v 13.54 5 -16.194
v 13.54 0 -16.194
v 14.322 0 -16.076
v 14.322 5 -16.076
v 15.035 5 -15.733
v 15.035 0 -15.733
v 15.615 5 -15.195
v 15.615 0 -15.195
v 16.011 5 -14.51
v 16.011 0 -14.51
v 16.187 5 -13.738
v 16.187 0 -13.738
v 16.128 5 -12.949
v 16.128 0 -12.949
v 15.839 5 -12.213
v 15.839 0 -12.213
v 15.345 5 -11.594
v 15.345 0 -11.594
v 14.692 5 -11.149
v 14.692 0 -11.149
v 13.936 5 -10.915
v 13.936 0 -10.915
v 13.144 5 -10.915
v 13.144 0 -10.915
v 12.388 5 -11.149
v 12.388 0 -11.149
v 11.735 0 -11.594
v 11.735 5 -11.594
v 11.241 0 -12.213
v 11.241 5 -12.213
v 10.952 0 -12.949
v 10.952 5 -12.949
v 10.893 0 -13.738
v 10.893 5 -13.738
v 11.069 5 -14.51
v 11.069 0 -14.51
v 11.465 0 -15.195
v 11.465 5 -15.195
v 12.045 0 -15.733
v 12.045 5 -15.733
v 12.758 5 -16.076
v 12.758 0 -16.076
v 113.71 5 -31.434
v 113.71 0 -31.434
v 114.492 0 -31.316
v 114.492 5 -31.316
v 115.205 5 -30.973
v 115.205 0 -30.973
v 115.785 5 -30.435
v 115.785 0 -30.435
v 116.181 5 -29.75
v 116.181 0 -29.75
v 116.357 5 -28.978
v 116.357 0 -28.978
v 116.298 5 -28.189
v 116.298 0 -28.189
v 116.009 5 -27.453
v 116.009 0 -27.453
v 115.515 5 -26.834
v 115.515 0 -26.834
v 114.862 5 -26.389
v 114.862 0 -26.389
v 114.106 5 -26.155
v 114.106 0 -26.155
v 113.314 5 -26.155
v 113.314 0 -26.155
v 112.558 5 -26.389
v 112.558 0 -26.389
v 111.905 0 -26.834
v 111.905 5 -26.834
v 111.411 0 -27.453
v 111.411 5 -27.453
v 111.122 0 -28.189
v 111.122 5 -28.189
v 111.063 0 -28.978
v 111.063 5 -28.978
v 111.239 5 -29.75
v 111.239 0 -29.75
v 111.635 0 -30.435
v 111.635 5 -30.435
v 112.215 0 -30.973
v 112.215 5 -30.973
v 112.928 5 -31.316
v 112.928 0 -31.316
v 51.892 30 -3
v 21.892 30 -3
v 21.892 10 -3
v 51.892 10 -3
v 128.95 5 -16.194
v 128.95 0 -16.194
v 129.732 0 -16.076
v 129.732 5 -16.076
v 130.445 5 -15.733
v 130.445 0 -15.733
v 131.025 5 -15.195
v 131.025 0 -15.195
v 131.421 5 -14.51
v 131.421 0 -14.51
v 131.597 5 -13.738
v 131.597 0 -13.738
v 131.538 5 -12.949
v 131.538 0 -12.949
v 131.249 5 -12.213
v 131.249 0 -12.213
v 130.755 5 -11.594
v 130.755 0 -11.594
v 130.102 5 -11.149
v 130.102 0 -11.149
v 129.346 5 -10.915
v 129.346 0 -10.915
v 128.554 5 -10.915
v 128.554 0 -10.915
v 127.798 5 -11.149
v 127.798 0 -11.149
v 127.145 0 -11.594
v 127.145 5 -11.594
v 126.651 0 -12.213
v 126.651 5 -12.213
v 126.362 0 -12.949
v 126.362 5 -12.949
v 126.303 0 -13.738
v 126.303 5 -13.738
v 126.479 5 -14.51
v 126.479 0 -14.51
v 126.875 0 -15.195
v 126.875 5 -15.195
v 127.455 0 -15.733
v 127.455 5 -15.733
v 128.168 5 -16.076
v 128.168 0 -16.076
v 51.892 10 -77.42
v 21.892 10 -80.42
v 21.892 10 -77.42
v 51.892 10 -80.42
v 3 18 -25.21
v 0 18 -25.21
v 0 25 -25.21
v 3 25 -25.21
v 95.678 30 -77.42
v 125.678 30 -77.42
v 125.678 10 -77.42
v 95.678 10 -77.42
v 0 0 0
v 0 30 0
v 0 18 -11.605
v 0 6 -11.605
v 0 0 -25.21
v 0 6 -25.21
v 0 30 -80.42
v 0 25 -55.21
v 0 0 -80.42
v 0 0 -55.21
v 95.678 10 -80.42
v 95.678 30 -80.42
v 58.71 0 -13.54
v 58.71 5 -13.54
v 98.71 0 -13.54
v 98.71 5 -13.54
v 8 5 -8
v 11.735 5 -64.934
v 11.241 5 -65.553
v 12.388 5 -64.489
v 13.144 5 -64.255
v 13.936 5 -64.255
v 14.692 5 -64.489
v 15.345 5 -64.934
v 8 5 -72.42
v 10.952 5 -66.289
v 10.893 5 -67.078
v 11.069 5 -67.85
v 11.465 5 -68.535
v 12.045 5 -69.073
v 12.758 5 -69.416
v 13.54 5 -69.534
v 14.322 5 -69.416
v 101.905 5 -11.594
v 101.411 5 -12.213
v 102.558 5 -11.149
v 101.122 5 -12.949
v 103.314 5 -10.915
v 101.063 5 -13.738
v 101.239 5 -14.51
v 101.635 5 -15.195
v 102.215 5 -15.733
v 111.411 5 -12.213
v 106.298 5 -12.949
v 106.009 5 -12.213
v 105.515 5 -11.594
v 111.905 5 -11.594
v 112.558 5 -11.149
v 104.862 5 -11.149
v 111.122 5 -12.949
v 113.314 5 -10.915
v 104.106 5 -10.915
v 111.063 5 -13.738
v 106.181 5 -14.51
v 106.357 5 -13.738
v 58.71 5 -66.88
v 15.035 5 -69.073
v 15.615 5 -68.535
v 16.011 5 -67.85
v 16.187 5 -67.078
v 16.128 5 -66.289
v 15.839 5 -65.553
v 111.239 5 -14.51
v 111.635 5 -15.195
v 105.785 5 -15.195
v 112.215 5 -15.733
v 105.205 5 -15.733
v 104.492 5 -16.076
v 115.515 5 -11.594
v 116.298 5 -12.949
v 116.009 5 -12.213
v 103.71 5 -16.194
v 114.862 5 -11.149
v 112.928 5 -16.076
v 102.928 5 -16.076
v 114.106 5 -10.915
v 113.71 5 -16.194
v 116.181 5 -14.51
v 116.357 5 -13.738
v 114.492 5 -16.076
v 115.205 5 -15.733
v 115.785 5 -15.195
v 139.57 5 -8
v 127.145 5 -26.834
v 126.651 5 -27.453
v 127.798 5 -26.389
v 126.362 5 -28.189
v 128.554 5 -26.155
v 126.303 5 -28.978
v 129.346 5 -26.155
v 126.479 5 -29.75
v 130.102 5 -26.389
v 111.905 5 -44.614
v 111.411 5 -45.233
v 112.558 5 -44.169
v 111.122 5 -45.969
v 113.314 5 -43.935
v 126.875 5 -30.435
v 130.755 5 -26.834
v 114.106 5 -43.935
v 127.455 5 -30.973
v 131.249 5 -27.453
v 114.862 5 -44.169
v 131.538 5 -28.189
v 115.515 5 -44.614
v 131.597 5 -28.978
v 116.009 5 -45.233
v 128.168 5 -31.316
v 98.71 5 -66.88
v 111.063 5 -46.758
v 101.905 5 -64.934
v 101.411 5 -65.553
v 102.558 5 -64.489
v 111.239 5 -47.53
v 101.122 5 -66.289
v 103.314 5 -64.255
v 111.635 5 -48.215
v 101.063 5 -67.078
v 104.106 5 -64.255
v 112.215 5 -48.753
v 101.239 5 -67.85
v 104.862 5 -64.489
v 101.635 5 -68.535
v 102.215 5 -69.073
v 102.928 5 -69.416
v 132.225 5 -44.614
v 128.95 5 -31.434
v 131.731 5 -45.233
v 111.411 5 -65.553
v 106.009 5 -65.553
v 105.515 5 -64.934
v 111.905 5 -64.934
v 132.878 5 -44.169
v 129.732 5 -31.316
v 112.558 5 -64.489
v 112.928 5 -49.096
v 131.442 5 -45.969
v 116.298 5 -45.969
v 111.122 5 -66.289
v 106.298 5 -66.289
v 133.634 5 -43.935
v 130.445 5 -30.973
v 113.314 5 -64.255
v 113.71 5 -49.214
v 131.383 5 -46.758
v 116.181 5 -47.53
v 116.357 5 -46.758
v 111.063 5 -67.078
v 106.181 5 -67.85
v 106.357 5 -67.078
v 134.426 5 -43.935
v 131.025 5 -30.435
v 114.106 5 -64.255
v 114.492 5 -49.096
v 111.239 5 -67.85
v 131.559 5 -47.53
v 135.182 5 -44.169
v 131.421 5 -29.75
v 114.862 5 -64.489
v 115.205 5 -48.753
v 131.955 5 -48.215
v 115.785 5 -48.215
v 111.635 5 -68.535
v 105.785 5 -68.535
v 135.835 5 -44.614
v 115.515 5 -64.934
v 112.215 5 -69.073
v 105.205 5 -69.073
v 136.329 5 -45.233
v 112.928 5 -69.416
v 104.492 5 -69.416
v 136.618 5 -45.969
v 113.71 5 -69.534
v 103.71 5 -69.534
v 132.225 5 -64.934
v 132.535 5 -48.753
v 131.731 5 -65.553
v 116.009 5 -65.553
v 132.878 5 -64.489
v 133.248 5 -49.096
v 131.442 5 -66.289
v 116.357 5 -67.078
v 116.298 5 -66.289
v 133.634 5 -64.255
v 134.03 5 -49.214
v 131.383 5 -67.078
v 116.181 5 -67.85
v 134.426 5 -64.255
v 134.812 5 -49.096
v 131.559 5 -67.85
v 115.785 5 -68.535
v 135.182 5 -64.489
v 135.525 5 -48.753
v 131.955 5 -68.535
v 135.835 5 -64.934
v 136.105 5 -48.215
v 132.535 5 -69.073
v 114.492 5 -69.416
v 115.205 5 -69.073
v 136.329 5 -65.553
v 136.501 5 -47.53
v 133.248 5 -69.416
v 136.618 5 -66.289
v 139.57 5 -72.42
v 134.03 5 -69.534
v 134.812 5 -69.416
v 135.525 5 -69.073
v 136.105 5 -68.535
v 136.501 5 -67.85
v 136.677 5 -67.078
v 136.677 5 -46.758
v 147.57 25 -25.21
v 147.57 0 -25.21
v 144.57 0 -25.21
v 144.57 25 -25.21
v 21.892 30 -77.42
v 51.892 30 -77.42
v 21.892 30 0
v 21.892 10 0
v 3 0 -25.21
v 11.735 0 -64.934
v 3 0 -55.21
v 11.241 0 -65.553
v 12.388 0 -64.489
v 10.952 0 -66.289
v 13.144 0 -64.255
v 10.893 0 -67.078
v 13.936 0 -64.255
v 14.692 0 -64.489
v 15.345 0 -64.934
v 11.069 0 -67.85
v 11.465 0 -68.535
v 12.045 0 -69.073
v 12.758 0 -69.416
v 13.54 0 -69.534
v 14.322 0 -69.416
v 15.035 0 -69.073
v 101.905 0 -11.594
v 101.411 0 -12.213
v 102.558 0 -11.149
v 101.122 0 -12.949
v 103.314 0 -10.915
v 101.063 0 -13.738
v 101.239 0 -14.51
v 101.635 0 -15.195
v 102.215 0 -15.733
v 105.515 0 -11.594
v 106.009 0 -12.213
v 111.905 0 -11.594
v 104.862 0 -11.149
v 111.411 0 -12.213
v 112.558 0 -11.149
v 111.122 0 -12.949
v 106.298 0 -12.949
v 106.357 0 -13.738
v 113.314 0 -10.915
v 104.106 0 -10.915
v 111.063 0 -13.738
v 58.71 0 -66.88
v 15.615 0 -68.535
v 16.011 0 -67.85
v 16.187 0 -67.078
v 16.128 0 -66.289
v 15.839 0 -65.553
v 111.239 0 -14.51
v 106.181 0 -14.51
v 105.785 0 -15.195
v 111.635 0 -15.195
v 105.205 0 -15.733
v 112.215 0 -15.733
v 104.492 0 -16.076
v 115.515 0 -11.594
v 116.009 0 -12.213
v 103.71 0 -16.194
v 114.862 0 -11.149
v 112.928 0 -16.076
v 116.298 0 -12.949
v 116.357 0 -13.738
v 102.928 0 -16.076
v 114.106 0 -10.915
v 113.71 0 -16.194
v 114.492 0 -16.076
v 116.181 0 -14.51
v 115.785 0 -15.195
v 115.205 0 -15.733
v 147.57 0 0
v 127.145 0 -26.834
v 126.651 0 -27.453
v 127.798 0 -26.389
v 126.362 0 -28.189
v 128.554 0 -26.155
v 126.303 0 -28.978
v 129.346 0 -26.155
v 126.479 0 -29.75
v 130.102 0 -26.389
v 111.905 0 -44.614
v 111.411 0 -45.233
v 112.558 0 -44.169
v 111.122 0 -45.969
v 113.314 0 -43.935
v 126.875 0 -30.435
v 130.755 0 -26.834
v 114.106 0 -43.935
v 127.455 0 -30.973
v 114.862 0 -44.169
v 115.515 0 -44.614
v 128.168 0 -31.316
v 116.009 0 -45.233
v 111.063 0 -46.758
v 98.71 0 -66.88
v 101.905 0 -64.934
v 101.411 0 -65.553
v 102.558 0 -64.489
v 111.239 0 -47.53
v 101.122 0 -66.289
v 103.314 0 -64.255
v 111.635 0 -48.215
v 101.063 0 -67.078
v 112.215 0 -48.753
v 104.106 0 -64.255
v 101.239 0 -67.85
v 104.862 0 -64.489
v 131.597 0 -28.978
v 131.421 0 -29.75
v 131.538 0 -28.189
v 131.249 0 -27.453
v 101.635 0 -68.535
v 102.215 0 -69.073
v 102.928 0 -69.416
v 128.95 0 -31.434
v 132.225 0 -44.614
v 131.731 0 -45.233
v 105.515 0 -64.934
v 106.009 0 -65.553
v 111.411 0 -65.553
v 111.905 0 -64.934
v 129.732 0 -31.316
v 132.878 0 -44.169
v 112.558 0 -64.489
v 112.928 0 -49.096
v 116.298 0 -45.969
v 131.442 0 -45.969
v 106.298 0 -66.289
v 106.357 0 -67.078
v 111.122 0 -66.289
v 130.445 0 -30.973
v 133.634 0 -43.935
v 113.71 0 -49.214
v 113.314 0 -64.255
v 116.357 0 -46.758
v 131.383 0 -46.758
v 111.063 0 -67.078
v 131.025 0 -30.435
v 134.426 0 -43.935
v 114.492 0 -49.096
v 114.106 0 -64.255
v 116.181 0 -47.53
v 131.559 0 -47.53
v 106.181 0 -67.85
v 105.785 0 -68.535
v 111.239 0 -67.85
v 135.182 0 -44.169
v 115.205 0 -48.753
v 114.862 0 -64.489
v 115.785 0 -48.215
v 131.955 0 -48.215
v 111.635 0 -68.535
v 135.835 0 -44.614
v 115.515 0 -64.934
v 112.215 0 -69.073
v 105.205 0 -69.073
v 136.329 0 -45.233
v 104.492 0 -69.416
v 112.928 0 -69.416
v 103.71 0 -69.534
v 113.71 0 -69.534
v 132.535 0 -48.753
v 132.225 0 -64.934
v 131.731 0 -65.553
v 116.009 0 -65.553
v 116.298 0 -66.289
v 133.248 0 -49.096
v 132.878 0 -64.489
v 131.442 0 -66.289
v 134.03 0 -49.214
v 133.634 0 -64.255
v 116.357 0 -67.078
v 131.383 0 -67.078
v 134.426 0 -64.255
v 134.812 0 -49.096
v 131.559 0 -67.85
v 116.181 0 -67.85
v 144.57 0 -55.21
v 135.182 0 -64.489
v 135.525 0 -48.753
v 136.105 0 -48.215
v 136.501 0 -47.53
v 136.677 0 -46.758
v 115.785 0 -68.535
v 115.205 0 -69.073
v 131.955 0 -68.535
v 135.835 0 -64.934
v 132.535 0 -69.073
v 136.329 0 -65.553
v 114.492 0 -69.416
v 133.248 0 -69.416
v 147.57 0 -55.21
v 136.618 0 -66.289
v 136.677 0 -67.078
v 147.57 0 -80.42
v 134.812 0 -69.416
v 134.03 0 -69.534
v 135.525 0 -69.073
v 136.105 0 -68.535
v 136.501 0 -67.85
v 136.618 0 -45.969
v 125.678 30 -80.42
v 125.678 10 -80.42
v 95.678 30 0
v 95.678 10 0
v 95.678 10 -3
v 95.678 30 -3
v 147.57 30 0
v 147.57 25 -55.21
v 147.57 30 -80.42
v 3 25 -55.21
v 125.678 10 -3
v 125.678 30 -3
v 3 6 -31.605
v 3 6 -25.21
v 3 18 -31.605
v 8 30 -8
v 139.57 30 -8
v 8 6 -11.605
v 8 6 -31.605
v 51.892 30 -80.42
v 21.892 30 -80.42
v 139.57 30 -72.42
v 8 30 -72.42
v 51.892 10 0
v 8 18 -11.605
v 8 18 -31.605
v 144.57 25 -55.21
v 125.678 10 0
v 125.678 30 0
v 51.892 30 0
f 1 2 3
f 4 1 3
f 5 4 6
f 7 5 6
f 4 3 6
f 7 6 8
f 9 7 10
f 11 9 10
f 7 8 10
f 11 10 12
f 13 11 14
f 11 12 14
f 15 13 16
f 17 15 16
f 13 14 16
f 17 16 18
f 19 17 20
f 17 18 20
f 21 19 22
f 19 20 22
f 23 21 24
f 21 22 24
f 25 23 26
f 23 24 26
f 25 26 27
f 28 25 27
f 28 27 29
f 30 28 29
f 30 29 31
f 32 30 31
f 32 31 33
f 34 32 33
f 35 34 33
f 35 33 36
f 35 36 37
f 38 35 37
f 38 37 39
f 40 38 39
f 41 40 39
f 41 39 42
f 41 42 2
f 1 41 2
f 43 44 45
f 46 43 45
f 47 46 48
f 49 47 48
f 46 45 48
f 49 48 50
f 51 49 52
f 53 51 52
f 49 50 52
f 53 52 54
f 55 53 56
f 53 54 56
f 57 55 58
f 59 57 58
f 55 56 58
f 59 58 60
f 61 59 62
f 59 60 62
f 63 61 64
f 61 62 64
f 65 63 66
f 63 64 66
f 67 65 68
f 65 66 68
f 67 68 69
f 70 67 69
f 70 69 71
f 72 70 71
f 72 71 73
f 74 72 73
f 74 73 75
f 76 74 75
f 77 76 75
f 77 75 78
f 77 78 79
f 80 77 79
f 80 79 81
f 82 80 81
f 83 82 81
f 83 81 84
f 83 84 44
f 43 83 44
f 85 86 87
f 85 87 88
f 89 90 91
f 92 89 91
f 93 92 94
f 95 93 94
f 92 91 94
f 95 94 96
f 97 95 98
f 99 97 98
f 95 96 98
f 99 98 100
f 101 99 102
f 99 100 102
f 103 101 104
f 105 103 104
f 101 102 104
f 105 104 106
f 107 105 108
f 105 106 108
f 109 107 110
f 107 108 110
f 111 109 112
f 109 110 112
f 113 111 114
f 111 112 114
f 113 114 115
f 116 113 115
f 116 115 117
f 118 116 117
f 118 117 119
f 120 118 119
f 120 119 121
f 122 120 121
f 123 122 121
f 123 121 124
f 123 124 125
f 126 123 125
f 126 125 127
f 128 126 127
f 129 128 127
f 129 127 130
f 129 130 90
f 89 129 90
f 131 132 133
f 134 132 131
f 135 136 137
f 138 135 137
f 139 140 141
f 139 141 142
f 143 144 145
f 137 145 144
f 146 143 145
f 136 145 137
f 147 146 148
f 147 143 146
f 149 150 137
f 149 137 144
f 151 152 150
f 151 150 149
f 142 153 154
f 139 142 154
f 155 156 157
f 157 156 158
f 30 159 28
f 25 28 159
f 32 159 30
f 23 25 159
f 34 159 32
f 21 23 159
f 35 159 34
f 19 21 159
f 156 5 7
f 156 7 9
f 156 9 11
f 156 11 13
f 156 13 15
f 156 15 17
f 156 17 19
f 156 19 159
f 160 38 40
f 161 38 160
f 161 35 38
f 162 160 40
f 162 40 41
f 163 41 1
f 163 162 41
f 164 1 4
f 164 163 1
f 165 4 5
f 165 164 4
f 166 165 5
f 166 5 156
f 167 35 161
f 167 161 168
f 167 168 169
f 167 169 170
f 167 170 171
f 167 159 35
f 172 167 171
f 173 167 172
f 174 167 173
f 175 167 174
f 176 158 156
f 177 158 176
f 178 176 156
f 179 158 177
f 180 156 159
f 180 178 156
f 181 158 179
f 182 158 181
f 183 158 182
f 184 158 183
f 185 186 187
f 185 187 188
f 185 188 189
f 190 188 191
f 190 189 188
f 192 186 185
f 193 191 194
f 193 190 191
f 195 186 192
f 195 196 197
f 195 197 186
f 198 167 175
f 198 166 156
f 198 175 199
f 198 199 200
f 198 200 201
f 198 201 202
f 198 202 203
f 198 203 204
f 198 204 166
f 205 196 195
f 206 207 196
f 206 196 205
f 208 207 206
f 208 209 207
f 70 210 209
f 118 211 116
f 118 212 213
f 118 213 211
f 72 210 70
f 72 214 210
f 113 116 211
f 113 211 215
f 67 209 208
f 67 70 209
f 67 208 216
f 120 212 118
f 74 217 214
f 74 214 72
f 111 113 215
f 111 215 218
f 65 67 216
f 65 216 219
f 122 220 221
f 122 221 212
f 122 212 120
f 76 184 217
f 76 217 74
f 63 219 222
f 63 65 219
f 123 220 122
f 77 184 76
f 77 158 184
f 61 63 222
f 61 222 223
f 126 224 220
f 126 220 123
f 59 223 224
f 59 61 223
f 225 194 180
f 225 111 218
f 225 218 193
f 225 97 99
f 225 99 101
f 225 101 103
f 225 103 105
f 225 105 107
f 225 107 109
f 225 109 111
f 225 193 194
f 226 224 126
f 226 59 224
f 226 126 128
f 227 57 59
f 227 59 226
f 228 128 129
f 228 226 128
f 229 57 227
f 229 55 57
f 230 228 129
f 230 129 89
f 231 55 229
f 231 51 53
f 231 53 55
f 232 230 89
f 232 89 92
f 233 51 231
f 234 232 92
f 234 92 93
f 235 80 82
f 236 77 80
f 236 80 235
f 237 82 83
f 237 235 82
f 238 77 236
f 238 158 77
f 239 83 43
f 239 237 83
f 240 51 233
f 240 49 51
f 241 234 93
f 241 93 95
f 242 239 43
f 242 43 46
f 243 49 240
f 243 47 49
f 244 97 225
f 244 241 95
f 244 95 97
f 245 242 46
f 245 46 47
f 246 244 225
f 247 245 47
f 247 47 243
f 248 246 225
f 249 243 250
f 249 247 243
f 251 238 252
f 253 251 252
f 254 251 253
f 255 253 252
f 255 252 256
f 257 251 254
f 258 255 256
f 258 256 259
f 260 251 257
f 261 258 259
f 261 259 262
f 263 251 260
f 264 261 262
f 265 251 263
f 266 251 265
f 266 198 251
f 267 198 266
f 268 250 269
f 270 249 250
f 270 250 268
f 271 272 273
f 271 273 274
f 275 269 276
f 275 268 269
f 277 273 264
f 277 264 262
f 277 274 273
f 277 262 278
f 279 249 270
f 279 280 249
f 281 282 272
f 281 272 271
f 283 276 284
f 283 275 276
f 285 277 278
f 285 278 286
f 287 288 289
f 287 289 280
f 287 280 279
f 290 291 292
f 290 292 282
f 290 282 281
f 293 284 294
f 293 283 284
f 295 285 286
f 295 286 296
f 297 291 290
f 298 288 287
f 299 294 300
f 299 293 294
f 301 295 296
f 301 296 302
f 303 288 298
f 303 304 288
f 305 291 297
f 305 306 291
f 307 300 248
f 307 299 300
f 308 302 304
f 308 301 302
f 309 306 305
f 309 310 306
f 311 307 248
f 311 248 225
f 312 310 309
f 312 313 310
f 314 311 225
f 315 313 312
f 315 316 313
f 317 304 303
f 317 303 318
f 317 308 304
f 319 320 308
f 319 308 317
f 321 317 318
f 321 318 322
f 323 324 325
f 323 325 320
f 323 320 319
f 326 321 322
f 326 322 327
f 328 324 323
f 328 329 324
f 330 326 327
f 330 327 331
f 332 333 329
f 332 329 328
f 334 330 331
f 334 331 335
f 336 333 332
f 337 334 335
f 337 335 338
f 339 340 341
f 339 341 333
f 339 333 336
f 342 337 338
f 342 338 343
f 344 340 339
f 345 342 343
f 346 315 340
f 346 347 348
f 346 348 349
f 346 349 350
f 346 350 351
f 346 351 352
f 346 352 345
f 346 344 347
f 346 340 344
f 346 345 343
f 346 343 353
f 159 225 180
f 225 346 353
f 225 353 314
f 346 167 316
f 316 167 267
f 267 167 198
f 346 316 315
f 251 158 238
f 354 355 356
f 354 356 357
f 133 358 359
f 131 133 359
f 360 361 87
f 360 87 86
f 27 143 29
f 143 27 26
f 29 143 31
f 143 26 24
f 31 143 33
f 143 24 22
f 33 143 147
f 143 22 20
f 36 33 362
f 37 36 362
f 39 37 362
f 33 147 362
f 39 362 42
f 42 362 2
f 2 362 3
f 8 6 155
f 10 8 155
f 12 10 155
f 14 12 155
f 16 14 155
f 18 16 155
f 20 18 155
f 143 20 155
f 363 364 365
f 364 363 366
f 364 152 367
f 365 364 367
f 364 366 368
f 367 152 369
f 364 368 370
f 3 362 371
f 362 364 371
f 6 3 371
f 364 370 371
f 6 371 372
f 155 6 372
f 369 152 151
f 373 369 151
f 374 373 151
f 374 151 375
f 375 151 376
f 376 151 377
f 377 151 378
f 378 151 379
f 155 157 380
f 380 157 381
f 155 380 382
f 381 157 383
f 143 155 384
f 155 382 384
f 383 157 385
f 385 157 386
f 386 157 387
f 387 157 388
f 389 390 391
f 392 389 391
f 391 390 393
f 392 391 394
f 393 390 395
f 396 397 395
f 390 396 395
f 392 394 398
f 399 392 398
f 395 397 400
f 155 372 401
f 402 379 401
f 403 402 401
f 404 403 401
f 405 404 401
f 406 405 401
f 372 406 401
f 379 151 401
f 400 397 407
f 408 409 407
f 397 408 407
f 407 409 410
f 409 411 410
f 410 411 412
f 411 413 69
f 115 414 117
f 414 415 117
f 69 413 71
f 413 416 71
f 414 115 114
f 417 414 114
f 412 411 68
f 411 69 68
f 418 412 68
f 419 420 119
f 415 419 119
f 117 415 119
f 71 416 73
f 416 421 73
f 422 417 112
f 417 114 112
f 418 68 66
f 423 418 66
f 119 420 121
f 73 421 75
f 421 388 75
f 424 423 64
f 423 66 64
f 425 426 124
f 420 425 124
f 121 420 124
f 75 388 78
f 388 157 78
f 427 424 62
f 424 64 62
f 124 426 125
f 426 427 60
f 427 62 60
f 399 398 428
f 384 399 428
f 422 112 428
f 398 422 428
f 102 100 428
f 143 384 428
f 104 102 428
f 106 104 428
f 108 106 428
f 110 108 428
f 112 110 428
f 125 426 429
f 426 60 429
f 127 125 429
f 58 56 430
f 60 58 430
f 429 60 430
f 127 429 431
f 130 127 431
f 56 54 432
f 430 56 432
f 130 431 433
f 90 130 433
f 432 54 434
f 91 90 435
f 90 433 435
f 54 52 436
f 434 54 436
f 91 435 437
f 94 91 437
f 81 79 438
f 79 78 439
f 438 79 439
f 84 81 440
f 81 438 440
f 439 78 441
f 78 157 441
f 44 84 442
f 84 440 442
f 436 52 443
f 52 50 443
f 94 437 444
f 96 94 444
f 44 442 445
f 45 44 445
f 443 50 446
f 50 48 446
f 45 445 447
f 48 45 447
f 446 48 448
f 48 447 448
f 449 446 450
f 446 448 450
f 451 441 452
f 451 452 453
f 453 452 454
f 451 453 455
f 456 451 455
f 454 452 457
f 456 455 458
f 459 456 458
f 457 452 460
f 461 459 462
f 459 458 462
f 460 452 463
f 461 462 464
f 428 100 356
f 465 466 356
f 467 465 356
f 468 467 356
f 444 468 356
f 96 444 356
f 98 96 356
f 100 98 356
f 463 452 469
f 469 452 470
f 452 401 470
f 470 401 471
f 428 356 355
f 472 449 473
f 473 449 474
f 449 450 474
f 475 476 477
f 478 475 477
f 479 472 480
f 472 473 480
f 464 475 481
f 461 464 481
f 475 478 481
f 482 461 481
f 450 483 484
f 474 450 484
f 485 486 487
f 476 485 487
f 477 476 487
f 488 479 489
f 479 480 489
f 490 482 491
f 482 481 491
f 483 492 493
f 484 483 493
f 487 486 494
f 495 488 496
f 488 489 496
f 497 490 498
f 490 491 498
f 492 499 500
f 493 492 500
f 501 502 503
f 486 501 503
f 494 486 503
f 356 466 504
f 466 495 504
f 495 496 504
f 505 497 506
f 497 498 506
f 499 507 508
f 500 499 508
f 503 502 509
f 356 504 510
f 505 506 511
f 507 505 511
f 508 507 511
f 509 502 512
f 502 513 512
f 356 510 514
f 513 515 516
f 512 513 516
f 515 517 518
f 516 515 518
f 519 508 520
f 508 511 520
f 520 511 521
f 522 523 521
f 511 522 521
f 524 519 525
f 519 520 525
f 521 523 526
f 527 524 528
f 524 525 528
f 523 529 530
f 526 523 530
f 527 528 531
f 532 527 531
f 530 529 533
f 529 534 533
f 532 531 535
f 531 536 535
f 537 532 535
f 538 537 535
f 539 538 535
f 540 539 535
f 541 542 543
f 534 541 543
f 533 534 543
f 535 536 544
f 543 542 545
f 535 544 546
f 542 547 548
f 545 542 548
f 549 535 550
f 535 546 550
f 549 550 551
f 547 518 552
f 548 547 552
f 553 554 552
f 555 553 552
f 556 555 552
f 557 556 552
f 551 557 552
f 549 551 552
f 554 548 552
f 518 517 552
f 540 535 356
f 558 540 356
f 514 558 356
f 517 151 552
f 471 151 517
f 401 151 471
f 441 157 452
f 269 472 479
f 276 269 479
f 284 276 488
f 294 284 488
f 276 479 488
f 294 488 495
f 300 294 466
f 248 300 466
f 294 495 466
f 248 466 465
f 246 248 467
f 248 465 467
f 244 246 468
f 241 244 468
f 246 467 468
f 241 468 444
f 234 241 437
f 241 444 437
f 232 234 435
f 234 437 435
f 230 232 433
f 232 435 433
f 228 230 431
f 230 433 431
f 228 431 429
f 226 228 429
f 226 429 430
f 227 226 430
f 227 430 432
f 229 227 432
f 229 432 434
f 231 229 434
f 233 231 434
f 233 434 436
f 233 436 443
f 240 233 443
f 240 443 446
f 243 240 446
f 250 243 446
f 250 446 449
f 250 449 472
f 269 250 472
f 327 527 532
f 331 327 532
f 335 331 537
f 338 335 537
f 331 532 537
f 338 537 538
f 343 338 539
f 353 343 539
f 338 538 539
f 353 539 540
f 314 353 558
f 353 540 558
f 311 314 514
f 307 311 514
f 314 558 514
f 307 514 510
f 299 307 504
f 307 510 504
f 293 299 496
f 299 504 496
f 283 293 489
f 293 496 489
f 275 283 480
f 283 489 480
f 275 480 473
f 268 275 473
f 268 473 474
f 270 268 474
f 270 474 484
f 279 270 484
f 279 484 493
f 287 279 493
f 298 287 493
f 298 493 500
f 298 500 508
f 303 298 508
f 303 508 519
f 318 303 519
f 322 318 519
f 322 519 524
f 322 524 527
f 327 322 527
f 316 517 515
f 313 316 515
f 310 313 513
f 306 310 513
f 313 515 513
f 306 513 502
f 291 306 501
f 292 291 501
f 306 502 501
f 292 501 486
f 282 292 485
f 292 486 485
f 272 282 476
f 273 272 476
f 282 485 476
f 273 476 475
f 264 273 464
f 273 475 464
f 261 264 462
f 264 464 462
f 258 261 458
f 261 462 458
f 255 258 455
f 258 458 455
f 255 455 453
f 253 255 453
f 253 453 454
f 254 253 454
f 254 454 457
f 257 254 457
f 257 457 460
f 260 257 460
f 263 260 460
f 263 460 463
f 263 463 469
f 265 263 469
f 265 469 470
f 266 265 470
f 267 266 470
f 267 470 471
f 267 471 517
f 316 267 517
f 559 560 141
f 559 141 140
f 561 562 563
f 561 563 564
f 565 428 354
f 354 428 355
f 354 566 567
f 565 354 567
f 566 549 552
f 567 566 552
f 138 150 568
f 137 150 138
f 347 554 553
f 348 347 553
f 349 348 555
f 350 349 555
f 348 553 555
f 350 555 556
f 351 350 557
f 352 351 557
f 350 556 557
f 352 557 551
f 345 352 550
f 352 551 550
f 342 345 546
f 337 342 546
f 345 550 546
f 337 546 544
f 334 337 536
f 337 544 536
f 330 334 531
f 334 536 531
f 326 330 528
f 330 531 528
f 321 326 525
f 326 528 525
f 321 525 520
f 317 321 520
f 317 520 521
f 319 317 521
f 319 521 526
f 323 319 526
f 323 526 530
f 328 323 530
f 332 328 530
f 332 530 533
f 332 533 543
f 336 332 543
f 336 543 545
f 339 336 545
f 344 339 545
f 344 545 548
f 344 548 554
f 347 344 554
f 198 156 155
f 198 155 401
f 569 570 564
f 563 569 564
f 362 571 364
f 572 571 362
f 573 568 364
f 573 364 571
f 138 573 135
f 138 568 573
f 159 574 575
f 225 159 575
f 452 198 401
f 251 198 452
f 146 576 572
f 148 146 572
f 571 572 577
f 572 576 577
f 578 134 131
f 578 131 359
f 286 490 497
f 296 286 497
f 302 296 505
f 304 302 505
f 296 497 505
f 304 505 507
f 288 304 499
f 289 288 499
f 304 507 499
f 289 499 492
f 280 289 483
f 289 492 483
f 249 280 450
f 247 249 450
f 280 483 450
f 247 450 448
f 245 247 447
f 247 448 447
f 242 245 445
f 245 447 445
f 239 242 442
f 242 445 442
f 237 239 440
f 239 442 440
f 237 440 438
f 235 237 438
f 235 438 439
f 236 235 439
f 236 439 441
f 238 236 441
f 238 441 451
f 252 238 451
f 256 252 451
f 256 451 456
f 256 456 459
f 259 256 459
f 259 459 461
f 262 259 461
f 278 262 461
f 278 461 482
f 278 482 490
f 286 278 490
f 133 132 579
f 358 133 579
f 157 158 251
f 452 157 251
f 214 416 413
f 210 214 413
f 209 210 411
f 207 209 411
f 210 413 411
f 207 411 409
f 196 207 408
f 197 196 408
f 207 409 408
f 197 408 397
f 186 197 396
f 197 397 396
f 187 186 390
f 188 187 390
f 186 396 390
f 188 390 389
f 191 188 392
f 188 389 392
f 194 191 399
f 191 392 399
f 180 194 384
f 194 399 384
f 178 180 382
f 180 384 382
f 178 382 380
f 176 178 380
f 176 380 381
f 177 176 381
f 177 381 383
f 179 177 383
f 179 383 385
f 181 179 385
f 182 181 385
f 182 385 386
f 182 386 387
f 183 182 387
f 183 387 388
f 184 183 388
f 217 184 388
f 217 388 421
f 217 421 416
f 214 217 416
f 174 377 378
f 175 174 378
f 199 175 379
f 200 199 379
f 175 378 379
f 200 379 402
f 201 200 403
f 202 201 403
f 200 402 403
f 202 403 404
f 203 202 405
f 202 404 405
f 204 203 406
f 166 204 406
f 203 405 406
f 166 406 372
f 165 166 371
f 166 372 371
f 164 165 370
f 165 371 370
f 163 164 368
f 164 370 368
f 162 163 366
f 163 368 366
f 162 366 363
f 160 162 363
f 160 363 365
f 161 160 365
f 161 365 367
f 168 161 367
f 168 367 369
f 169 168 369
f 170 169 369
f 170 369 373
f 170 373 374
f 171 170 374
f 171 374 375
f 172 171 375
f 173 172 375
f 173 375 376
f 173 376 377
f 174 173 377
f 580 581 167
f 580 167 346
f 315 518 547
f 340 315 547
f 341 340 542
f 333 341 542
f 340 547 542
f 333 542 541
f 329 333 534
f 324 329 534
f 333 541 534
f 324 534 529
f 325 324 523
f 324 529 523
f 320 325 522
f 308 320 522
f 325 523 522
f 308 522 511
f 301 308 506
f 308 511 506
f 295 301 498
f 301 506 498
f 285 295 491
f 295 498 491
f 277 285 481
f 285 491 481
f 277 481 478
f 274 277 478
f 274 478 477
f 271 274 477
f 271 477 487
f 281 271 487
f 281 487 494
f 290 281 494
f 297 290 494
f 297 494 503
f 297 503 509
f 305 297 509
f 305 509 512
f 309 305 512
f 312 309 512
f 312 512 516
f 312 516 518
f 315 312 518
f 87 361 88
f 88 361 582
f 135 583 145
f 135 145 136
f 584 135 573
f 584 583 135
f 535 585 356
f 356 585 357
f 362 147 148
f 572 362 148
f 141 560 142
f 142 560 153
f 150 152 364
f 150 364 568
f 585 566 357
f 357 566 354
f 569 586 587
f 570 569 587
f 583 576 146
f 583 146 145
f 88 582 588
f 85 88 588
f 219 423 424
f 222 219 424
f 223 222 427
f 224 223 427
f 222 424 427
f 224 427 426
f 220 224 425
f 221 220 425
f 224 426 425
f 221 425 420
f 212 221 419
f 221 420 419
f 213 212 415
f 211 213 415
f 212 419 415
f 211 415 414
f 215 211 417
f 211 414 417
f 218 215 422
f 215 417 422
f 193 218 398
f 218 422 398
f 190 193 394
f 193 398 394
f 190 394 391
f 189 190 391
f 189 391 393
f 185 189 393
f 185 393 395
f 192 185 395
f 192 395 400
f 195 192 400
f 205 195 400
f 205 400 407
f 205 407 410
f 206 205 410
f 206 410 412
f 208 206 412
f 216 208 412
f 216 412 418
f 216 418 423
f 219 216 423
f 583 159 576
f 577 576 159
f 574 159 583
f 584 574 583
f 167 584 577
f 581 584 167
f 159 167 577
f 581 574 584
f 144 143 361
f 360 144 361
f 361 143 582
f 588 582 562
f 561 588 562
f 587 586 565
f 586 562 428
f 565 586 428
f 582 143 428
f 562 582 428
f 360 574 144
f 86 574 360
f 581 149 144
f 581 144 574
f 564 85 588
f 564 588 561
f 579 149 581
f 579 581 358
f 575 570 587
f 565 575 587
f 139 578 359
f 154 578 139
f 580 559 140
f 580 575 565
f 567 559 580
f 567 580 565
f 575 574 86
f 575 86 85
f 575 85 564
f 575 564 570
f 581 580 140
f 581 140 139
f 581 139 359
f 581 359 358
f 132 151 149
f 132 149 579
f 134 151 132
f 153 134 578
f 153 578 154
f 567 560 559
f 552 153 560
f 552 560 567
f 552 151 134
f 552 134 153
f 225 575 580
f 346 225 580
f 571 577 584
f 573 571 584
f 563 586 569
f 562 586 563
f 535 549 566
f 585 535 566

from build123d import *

# Parameters (mm, degrees)
SKETCH1_W                  = 147.57
SKETCH1_H                  = 80.42
BOSS_EXTRUDE1_DEPTH        = 30
SKETCH2_W                  = 131.57
SKETCH2_H                  = 64.42
CUT_EXTRUDE1_DEPTH         = 25
F_4_0_209_DIAMETER_HOLE1_D = 5.3086
SKETCH13_W                 = 30
SKETCH13_H                 = 20
CUT_EXTRUDE3_DEPTH         = 3
MIRROR3_COPY_1_SKETCH_W    = 30
MIRROR3_COPY_1_SKETCH_H    = 20
MIRROR3_COPY_1_DEPTH       = 3
SKETCH19_W                 = 30
SKETCH19_H                 = 25
CUT_EXTRUDE4_DEPTH         = 3
SKETCH25_W                 = 40
SKETCH25_H                 = 53.34
CUT_EXTRUDE5_DEPTH         = 170.909626861
SKETCH30_W                 = 20
SKETCH30_H                 = 12
CUT_EXTRUDE7_DEPTH         = 164.851033869


with BuildPart() as part:
    # Sketch1 → Boss-Extrude1 (new body)
    with BuildSketch(Plane(origin=(0, 0, 0), x_dir=(1, 0, 0), z_dir=(0, 1, 0))):
        with Locations((73.785, 40.21)):
            Rectangle(SKETCH1_W, SKETCH1_H)
    extrude(amount=BOSS_EXTRUDE1_DEPTH)

    # Sketch2 → Cut-Extrude1 (cut)
    with BuildSketch(Plane(origin=(0, 30, 0), x_dir=(1, 0, 0), z_dir=(0, 1, 0))):
        with Locations((73.785, 40.21)):
            Rectangle(SKETCH2_W, SKETCH2_H)
    extrude(amount=-CUT_EXTRUDE1_DEPTH, mode=Mode.SUBTRACT)

    # #4 (0.209) Diameter Hole1 (through all)
    with Locations(Plane(origin=(13.54, 5, -66.88), x_dir=(0, 0, 1), z_dir=(0, 1, 0))):
        with Locations((0, 0), (53.34, 0), (53.34, 90.17), (53.34, 100.17), (38.1, 100.17), (38.1, 115.41), (53.34, 115.41), (20.32, 120.49), (0, 120.49), (0, 100.17), (20.32, 100.17), (0, 90.17)):
            Hole(F_4_0_209_DIAMETER_HOLE1_D / 2)

    # Sketch13 → Cut-Extrude3 (cut)
    with BuildSketch(Plane(origin=(0, 0, -80.42), x_dir=(-1, 0, 0), z_dir=(0, 0, -1))):
        with Locations((-110.6775, 20)):
            Rectangle(SKETCH13_W, SKETCH13_H)
    cut_extrude3 = extrude(amount=-CUT_EXTRUDE3_DEPTH, mode=Mode.SUBTRACT)

    # Mirror2: Cut-Extrude3 across plane
    add(cut_extrude3.mirror(Plane(origin=(73.785, 0, 0), x_dir=(0, 0, 1), z_dir=(1, 0, 0))), mode=Mode.SUBTRACT)

    # Mirror3: Cut-Extrude3 across plane
    add(cut_extrude3.mirror(Plane(origin=(0, 0, -40.21), x_dir=(1, 0, 0), z_dir=(0, 0, -1))), mode=Mode.SUBTRACT)

    # Mirror3 copy 1 sketch → Mirror3 copy 1 (cut)
    with BuildSketch(Plane(origin=(147.57, 0, 0), x_dir=(1, 0, 0), z_dir=(0, 0, 1))):
        with Locations((-110.6775, 20)):
            Rectangle(MIRROR3_COPY_1_SKETCH_W, MIRROR3_COPY_1_SKETCH_H)
    extrude(amount=-MIRROR3_COPY_1_DEPTH, mode=Mode.SUBTRACT)

    # Sketch19 → Cut-Extrude4 (cut)
    with BuildSketch(Plane.ZY):
        with Locations((-40.21, 12.5)):
            Rectangle(SKETCH19_W, SKETCH19_H)
    cut_extrude4 = extrude(amount=-CUT_EXTRUDE4_DEPTH, mode=Mode.SUBTRACT)

    # Mirror7: Cut-Extrude4 across plane
    add(cut_extrude4.mirror(Plane(origin=(73.785, 0, 0), x_dir=(0, 0, 1), z_dir=(1, 0, 0))), mode=Mode.SUBTRACT)

    # Sketch25 → Cut-Extrude5 (cut, through all)
    with BuildSketch(Plane(origin=(0, 5, 0), x_dir=(1, 0, 0), z_dir=(0, 1, 0))):
        with Locations((78.71, 40.21)):
            Rectangle(SKETCH25_W, SKETCH25_H)
    extrude(amount=-CUT_EXTRUDE5_DEPTH, mode=Mode.SUBTRACT)

    # Sketch30 → Cut-Extrude7 (cut, through all)
    with BuildSketch(Plane(origin=(8, 0, 0), x_dir=(0, 0, -1), z_dir=(1, 0, 0))):
        with Locations((21.605, 12)):
            Rectangle(SKETCH30_W, SKETCH30_H)
    extrude(amount=-CUT_EXTRUDE7_DEPTH, mode=Mode.SUBTRACT)


solid = part.part
